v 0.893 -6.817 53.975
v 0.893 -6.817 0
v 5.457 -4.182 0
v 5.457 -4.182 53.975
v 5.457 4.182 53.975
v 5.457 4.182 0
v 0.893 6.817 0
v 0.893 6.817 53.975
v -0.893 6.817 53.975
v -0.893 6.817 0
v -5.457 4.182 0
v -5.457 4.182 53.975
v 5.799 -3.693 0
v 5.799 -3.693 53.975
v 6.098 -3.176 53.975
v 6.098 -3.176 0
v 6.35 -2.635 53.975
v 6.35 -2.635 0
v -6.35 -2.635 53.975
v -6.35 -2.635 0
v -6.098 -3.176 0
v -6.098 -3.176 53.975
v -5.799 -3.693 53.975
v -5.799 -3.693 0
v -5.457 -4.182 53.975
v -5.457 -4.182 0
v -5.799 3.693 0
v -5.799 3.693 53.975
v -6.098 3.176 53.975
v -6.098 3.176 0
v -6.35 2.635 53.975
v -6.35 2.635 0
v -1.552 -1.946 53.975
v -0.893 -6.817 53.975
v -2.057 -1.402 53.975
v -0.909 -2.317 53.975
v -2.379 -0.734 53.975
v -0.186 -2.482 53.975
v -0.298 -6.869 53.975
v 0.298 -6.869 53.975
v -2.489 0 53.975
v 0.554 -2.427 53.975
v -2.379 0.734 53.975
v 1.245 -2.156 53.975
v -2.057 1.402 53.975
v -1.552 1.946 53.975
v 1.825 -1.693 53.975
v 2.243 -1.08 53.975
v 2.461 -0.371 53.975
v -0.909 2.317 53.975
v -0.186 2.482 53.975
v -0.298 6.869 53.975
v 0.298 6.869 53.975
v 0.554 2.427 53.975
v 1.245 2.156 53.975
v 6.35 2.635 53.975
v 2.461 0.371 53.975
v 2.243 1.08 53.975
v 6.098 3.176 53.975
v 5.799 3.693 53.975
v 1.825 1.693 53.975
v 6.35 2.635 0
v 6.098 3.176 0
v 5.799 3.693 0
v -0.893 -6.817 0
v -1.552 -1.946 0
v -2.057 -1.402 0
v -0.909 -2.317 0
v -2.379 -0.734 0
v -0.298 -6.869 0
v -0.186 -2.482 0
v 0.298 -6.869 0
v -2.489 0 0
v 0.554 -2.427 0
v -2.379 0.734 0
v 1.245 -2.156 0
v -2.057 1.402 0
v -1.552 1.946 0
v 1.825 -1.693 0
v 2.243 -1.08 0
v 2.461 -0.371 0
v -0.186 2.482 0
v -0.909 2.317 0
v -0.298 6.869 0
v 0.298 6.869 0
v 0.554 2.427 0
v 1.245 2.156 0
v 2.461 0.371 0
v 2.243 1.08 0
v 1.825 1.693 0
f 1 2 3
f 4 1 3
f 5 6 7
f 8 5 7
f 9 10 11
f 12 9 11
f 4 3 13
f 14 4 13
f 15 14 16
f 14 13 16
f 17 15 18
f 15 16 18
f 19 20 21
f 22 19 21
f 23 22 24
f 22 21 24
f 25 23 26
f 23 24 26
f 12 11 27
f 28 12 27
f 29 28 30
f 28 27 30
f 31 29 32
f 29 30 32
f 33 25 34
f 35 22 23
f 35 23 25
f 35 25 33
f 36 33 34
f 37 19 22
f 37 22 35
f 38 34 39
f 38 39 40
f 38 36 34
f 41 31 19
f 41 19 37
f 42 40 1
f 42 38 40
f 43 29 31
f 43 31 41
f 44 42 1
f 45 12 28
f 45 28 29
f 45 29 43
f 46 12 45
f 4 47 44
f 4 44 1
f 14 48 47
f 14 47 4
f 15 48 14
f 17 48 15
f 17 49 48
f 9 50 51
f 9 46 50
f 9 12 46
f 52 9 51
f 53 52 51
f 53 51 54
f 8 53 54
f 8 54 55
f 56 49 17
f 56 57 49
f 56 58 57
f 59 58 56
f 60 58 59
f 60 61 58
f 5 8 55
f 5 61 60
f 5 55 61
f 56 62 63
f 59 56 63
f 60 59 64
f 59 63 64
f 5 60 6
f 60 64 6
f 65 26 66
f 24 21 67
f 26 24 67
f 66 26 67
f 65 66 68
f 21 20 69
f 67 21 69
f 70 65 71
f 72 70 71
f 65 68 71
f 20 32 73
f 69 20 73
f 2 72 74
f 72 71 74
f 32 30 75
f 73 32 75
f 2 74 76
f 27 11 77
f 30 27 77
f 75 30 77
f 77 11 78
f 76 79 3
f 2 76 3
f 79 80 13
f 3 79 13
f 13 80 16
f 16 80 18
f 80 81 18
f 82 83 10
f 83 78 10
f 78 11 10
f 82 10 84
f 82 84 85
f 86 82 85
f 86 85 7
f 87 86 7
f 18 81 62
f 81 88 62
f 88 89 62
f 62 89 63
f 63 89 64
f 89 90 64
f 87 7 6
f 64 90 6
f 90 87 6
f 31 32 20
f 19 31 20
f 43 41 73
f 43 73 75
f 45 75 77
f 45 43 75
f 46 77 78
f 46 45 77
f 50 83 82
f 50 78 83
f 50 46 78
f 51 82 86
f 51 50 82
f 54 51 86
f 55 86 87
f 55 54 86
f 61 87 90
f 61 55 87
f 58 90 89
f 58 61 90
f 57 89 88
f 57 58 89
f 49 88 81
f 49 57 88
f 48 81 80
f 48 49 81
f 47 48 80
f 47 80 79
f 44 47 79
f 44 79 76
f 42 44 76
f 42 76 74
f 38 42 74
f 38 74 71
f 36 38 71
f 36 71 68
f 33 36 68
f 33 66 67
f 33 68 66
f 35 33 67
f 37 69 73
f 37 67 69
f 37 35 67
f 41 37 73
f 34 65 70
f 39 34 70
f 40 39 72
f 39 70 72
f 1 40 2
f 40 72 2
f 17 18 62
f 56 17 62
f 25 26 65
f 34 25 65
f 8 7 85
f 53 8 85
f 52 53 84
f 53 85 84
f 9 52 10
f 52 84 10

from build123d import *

# Parameters (mm, degrees)
BOSS_EXTRUDE1_DEPTH     = 53.975
CUT_EXTRUDE1_DEPTH      = 55.780368286
CUT_EXTRUDE1_DEPTH_BACK = 55.780368286
SKETCH2_R               = 2.4892


with BuildPart() as part:
    # Sketch1 → Boss-Extrude1 (new body)
    with BuildSketch(Plane.XY):
        with BuildLine():
            ThreePointArc((6.35, 2.634980936), (5.953924622, 3.437499983), (5.456960429, 4.181770846))
            Line((5.456960429, 4.181770846), (0.893039571, 6.816751782))
            ThreePointArc((0.893039571, 6.816751782), (0, 6.874999966), (-0.893039571, 6.816751782))
            Line((-0.893039571, 6.816751782), (-5.456960429, 4.181770846))
            ThreePointArc((-5.456960429, 4.181770846), (-5.953924622, 3.437499983), (-6.35, 2.634980936))
            Line((-6.35, 2.634980936), (-6.35, -2.634980936))
            ThreePointArc((-6.35, -2.634980936), (-5.953924622, -3.437499983), (-5.456960429, -4.181770846))
            Line((-5.456960429, -4.181770846), (-0.893039571, -6.816751782))
            ThreePointArc((-0.893039571, -6.816751782), (0, -6.874999966), (0.893039571, -6.816751782))
            Line((0.893039571, -6.816751782), (5.456960429, -4.181770846))
            ThreePointArc((5.456960429, -4.181770846), (5.953924622, -3.437499983), (6.35, -2.634980936))
            Line((6.35, -2.634980936), (6.35, 2.634980936))
        make_face()
    extrude(amount=BOSS_EXTRUDE1_DEPTH)

    # Sketch2 → Cut-Extrude1 (cut, two sides: drawn at the far end of the back side and taken through both)
    with BuildSketch(Plane(origin=(0, 0, 0), x_dir=(-1, 0, 0), z_dir=(0, 0, -1)).offset(-CUT_EXTRUDE1_DEPTH_BACK)):
        Circle(SKETCH2_R)
    extrude(amount=CUT_EXTRUDE1_DEPTH + CUT_EXTRUDE1_DEPTH_BACK, mode=Mode.SUBTRACT)


solid = part.part
